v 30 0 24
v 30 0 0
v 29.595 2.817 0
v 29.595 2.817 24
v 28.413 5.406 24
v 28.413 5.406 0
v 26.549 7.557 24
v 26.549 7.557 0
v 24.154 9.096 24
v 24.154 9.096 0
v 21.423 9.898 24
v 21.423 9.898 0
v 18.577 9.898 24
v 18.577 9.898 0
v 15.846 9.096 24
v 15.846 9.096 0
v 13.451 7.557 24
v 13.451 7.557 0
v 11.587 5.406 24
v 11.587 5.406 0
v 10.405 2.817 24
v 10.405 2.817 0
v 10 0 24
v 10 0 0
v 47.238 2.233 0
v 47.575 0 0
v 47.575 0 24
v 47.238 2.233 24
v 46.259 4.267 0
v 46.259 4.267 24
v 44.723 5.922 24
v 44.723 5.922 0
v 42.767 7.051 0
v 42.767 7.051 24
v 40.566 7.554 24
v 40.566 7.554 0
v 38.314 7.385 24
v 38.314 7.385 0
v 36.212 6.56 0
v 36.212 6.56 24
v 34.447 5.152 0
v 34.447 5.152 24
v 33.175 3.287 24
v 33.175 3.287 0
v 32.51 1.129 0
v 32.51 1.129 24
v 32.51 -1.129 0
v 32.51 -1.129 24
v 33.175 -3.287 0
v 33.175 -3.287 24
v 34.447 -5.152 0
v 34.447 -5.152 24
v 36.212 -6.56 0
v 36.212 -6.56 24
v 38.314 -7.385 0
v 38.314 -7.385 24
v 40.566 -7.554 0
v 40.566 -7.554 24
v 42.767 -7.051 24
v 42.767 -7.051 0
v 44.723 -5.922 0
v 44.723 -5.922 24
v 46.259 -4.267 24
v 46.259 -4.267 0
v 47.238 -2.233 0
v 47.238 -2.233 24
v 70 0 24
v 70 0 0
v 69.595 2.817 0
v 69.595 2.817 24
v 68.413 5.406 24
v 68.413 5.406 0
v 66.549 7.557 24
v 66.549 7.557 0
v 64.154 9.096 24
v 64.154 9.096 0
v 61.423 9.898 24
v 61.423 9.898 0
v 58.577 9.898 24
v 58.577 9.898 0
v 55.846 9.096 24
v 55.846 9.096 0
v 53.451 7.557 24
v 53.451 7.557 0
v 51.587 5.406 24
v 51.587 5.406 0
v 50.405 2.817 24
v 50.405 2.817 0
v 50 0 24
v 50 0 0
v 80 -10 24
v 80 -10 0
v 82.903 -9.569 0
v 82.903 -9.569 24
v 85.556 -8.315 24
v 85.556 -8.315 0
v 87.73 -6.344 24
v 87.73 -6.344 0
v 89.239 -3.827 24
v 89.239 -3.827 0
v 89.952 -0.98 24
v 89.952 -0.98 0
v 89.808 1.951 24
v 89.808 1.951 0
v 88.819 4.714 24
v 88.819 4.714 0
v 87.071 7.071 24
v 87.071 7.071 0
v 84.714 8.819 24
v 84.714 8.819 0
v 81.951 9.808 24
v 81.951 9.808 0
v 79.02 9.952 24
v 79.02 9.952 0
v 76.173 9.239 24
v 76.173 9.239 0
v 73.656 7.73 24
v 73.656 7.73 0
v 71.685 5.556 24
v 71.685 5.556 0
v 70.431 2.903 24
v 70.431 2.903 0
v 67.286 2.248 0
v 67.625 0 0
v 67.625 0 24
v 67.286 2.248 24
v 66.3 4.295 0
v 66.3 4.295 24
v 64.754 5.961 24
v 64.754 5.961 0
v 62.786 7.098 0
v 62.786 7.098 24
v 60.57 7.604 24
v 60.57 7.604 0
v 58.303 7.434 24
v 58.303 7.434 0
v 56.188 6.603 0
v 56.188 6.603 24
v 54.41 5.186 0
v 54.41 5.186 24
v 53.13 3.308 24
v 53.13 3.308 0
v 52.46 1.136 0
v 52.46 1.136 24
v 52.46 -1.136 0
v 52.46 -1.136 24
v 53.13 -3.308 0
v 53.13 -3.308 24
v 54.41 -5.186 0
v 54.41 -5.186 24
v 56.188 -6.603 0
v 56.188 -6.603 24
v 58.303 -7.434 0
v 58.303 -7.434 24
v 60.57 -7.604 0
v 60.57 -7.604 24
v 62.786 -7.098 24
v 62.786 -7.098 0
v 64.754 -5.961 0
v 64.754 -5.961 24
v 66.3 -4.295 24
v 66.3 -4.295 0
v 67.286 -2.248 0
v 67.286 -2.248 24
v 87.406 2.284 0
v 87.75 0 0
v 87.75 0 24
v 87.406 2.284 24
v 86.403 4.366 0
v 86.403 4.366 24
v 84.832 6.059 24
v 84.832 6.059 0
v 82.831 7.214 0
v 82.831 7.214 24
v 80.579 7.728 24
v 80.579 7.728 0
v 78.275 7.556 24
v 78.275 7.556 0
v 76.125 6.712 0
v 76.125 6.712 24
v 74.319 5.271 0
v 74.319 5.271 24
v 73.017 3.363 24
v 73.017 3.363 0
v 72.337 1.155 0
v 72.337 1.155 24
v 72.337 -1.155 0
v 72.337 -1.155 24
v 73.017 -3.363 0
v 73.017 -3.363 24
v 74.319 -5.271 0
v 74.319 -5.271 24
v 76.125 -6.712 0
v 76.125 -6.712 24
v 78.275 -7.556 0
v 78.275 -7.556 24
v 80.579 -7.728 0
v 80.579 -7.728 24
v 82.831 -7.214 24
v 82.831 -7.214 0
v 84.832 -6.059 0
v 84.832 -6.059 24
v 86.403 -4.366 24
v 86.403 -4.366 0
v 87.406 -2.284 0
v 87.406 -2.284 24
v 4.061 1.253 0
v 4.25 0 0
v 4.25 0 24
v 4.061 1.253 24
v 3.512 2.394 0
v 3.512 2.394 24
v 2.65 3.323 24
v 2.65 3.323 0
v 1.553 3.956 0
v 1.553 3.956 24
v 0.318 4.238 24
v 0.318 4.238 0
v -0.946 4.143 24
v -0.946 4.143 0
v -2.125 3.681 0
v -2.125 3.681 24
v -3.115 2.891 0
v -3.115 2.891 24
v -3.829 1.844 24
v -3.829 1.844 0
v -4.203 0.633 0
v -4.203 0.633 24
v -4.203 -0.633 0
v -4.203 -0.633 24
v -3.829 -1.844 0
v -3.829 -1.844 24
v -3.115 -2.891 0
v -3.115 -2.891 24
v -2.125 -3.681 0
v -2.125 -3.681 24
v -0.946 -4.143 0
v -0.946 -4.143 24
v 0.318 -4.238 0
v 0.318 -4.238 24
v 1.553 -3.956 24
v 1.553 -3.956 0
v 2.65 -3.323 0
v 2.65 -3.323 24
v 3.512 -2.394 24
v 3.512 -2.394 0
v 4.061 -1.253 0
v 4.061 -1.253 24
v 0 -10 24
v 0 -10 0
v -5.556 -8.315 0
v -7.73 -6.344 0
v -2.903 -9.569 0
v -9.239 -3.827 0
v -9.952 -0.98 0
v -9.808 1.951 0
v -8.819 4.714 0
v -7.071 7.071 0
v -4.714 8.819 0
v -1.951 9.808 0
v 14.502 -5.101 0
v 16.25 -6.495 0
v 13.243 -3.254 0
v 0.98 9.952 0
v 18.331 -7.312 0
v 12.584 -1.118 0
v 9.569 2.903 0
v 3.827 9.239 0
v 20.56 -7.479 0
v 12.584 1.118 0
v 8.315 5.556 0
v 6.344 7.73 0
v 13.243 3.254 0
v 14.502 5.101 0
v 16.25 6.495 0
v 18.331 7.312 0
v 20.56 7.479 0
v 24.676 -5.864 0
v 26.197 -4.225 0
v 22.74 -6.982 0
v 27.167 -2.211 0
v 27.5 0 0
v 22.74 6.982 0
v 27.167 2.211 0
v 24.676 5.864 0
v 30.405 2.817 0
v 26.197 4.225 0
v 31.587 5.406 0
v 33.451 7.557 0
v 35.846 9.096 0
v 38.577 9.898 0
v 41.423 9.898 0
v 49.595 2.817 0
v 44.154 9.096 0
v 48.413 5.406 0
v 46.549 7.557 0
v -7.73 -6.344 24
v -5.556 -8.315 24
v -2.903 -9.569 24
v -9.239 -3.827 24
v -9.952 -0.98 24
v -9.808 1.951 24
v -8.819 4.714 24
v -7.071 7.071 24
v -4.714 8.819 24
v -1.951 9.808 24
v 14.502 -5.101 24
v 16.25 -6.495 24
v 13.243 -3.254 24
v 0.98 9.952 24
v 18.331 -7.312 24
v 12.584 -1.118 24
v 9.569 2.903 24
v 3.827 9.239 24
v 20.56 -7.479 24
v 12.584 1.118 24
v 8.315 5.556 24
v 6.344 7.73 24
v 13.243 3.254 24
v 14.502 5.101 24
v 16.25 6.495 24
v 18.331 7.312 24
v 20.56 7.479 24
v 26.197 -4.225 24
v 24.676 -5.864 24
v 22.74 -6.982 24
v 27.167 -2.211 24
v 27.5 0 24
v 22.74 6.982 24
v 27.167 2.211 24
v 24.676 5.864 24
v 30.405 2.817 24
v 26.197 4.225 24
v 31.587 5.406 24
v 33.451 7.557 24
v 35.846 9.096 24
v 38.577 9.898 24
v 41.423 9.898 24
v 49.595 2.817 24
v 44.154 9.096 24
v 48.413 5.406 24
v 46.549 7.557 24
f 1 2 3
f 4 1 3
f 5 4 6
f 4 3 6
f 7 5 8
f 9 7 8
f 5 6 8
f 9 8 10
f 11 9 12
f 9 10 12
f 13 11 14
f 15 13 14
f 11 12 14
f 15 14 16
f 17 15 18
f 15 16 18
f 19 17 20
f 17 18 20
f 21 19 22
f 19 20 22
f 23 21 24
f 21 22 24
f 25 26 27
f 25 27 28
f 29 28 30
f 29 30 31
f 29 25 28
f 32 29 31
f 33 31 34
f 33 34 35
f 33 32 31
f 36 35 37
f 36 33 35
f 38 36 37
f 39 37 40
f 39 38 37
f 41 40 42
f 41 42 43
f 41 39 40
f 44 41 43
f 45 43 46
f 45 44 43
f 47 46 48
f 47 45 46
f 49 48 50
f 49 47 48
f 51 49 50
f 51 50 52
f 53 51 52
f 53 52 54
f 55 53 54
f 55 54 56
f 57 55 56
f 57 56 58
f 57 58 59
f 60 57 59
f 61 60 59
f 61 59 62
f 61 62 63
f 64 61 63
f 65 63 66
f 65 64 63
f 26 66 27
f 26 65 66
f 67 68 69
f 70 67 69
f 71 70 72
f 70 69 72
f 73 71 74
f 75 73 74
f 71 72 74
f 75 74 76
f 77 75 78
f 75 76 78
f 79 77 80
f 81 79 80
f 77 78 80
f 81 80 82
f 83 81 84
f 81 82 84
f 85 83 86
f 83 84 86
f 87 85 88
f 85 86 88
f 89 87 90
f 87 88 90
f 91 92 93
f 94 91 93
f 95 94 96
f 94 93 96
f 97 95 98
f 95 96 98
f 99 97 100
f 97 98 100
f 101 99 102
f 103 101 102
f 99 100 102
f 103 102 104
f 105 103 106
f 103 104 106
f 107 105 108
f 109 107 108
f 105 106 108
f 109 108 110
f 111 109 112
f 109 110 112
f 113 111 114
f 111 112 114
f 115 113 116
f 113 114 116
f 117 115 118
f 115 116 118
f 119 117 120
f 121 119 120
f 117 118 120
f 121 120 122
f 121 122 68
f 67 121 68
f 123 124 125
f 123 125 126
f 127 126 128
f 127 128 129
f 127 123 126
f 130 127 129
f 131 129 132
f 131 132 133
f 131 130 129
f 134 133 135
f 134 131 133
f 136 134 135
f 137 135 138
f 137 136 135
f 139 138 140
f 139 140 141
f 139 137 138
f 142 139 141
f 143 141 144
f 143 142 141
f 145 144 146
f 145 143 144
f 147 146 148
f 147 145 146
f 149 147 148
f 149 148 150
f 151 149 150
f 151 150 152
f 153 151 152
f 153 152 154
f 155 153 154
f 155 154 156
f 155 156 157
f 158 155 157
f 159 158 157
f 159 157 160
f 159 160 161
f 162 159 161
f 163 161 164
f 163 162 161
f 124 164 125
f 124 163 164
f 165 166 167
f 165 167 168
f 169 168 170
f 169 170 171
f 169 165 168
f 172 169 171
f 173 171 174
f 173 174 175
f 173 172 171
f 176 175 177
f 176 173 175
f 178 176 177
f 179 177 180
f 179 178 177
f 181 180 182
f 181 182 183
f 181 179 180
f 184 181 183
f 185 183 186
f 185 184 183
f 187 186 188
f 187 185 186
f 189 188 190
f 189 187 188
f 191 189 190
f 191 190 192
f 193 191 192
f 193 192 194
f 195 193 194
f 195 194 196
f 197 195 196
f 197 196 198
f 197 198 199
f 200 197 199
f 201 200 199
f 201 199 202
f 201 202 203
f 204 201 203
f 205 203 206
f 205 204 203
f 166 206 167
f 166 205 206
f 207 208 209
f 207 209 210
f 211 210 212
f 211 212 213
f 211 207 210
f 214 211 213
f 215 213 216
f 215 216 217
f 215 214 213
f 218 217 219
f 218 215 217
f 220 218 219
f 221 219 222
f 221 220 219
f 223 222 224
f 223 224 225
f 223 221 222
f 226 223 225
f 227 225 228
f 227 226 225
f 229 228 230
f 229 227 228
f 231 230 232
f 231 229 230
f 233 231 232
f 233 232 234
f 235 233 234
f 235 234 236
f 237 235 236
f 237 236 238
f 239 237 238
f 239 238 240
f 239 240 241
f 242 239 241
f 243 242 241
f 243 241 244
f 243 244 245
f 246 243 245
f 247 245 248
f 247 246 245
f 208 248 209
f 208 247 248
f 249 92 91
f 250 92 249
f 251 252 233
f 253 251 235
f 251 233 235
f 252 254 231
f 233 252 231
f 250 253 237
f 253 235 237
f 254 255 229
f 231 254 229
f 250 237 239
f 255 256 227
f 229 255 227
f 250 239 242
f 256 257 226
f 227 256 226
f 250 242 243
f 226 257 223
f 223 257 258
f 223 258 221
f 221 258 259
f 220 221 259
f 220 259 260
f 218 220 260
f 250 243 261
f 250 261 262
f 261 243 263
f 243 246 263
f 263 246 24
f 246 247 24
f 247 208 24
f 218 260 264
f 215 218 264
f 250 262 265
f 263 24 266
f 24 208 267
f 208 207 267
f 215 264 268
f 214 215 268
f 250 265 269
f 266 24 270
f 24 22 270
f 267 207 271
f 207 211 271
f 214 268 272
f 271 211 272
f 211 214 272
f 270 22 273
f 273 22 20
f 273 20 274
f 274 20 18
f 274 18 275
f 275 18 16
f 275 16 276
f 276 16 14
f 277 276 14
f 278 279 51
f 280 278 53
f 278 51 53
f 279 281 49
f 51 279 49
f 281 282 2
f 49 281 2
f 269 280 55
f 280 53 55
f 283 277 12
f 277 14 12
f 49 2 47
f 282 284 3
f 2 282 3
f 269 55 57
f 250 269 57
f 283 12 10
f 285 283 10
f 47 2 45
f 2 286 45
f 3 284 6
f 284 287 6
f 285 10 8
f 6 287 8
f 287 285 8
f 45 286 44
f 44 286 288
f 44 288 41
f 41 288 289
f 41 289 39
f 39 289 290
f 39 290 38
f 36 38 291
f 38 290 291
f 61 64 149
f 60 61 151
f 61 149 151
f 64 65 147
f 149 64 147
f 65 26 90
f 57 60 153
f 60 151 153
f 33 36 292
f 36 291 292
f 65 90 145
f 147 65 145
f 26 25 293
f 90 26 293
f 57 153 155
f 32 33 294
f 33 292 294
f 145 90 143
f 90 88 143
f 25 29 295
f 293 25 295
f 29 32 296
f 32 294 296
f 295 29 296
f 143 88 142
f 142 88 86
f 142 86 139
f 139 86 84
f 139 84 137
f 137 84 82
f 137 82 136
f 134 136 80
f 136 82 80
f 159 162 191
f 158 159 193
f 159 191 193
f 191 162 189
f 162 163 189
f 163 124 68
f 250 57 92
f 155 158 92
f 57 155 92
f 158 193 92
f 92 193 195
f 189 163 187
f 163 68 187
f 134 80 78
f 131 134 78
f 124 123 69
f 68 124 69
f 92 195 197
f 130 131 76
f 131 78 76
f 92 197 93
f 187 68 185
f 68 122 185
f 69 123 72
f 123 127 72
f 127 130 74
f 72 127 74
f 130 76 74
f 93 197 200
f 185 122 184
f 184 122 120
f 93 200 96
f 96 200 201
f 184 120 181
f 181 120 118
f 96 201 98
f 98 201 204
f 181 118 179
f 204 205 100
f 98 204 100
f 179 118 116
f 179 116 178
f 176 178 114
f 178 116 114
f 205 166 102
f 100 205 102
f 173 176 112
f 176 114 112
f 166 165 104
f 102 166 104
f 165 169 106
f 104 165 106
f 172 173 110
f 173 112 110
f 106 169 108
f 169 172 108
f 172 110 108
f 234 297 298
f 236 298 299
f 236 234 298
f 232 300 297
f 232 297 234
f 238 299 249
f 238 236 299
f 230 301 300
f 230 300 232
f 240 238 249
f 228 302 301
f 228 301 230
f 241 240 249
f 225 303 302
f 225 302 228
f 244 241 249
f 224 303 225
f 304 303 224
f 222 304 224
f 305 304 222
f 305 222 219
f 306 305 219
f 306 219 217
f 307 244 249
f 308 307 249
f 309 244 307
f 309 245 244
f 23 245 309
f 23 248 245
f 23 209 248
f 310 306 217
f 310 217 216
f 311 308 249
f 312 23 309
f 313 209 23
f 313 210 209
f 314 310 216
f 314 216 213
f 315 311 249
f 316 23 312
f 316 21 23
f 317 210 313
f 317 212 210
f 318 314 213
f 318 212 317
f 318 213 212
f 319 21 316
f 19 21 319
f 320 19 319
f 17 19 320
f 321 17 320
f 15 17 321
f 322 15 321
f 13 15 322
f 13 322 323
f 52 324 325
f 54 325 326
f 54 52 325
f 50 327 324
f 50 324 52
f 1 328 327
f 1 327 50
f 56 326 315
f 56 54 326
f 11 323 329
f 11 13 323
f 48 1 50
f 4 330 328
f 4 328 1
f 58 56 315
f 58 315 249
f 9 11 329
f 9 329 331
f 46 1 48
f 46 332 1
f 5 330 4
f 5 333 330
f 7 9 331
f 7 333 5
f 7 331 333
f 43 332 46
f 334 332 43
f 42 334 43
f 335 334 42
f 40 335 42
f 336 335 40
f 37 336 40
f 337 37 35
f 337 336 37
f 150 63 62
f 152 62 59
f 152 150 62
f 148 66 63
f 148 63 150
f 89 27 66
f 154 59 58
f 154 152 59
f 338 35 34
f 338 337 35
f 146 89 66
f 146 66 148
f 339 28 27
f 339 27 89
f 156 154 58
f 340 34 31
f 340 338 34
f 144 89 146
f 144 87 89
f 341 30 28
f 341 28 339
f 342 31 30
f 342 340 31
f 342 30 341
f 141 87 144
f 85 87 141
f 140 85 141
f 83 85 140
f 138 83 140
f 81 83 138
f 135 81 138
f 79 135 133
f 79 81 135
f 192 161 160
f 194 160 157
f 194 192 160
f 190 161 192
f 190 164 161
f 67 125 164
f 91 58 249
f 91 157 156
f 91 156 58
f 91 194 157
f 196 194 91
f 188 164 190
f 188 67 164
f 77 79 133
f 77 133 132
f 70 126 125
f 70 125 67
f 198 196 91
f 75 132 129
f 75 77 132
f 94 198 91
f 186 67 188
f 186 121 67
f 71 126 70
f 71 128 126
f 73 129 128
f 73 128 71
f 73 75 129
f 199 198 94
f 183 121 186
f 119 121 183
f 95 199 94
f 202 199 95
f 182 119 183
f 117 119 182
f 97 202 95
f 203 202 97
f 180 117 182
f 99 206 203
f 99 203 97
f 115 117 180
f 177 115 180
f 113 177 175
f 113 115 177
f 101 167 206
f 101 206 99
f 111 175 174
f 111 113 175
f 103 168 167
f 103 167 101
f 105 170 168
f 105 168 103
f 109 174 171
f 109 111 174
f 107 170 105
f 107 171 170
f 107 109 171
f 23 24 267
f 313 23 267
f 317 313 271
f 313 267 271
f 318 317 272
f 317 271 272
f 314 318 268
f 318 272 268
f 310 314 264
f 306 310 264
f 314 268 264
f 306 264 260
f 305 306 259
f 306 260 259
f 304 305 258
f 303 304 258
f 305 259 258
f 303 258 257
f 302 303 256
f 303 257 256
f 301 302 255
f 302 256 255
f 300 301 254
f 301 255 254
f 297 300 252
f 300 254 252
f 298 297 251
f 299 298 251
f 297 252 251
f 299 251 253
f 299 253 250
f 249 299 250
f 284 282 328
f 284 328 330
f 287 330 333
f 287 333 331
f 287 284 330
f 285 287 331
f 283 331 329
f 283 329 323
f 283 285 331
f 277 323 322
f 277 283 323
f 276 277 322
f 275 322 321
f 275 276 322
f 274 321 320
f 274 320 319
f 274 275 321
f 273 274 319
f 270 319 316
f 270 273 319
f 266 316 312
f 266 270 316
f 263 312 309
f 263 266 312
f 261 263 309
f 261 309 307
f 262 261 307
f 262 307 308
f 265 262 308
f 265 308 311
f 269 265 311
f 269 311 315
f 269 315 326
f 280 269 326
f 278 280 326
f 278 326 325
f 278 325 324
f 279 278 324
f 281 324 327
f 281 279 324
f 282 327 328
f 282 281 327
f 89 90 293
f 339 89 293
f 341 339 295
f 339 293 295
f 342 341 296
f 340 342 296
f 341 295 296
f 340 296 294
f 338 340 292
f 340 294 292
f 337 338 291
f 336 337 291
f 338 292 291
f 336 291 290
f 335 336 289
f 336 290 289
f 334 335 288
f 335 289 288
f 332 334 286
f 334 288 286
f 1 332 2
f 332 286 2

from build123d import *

# Parameters (mm, degrees)
SKETCH_R   = 4.25
SKETCH_R_2 = 7.5
SKETCH_R_3 = 7.575
SKETCH_R_4 = 7.625
SKETCH_R_5 = 7.75
PAD_DEPTH  = 24


with BuildPart() as part:
    # Sketch → Pad (new body)
    with BuildSketch(Plane.XY):
        with BuildLine():
            ThreePointArc((10, 0), (-7.071068, 7.071068), (0, -10))
            Line((80, -10), (0, -10))
            ThreePointArc((80, -10), (87.071068, 7.071068), (70, 0))
            ThreePointArc((70, 0), (60, 10), (50, 0))
            ThreePointArc((50, 0), (40, 10), (30, 0))
            ThreePointArc((30, 0), (20, 10), (10, 0))
        make_face()
        Circle(SKETCH_R, mode=Mode.SUBTRACT)
        with Locations((20, 0)):
            Circle(SKETCH_R_2, mode=Mode.SUBTRACT)
        with Locations((40, 0)):
            Circle(SKETCH_R_3, mode=Mode.SUBTRACT)
        with Locations((60, 0)):
            Circle(SKETCH_R_4, mode=Mode.SUBTRACT)
        with Locations((80, 0)):
            Circle(SKETCH_R_5, mode=Mode.SUBTRACT)
    extrude(amount=PAD_DEPTH)


solid = part.part
